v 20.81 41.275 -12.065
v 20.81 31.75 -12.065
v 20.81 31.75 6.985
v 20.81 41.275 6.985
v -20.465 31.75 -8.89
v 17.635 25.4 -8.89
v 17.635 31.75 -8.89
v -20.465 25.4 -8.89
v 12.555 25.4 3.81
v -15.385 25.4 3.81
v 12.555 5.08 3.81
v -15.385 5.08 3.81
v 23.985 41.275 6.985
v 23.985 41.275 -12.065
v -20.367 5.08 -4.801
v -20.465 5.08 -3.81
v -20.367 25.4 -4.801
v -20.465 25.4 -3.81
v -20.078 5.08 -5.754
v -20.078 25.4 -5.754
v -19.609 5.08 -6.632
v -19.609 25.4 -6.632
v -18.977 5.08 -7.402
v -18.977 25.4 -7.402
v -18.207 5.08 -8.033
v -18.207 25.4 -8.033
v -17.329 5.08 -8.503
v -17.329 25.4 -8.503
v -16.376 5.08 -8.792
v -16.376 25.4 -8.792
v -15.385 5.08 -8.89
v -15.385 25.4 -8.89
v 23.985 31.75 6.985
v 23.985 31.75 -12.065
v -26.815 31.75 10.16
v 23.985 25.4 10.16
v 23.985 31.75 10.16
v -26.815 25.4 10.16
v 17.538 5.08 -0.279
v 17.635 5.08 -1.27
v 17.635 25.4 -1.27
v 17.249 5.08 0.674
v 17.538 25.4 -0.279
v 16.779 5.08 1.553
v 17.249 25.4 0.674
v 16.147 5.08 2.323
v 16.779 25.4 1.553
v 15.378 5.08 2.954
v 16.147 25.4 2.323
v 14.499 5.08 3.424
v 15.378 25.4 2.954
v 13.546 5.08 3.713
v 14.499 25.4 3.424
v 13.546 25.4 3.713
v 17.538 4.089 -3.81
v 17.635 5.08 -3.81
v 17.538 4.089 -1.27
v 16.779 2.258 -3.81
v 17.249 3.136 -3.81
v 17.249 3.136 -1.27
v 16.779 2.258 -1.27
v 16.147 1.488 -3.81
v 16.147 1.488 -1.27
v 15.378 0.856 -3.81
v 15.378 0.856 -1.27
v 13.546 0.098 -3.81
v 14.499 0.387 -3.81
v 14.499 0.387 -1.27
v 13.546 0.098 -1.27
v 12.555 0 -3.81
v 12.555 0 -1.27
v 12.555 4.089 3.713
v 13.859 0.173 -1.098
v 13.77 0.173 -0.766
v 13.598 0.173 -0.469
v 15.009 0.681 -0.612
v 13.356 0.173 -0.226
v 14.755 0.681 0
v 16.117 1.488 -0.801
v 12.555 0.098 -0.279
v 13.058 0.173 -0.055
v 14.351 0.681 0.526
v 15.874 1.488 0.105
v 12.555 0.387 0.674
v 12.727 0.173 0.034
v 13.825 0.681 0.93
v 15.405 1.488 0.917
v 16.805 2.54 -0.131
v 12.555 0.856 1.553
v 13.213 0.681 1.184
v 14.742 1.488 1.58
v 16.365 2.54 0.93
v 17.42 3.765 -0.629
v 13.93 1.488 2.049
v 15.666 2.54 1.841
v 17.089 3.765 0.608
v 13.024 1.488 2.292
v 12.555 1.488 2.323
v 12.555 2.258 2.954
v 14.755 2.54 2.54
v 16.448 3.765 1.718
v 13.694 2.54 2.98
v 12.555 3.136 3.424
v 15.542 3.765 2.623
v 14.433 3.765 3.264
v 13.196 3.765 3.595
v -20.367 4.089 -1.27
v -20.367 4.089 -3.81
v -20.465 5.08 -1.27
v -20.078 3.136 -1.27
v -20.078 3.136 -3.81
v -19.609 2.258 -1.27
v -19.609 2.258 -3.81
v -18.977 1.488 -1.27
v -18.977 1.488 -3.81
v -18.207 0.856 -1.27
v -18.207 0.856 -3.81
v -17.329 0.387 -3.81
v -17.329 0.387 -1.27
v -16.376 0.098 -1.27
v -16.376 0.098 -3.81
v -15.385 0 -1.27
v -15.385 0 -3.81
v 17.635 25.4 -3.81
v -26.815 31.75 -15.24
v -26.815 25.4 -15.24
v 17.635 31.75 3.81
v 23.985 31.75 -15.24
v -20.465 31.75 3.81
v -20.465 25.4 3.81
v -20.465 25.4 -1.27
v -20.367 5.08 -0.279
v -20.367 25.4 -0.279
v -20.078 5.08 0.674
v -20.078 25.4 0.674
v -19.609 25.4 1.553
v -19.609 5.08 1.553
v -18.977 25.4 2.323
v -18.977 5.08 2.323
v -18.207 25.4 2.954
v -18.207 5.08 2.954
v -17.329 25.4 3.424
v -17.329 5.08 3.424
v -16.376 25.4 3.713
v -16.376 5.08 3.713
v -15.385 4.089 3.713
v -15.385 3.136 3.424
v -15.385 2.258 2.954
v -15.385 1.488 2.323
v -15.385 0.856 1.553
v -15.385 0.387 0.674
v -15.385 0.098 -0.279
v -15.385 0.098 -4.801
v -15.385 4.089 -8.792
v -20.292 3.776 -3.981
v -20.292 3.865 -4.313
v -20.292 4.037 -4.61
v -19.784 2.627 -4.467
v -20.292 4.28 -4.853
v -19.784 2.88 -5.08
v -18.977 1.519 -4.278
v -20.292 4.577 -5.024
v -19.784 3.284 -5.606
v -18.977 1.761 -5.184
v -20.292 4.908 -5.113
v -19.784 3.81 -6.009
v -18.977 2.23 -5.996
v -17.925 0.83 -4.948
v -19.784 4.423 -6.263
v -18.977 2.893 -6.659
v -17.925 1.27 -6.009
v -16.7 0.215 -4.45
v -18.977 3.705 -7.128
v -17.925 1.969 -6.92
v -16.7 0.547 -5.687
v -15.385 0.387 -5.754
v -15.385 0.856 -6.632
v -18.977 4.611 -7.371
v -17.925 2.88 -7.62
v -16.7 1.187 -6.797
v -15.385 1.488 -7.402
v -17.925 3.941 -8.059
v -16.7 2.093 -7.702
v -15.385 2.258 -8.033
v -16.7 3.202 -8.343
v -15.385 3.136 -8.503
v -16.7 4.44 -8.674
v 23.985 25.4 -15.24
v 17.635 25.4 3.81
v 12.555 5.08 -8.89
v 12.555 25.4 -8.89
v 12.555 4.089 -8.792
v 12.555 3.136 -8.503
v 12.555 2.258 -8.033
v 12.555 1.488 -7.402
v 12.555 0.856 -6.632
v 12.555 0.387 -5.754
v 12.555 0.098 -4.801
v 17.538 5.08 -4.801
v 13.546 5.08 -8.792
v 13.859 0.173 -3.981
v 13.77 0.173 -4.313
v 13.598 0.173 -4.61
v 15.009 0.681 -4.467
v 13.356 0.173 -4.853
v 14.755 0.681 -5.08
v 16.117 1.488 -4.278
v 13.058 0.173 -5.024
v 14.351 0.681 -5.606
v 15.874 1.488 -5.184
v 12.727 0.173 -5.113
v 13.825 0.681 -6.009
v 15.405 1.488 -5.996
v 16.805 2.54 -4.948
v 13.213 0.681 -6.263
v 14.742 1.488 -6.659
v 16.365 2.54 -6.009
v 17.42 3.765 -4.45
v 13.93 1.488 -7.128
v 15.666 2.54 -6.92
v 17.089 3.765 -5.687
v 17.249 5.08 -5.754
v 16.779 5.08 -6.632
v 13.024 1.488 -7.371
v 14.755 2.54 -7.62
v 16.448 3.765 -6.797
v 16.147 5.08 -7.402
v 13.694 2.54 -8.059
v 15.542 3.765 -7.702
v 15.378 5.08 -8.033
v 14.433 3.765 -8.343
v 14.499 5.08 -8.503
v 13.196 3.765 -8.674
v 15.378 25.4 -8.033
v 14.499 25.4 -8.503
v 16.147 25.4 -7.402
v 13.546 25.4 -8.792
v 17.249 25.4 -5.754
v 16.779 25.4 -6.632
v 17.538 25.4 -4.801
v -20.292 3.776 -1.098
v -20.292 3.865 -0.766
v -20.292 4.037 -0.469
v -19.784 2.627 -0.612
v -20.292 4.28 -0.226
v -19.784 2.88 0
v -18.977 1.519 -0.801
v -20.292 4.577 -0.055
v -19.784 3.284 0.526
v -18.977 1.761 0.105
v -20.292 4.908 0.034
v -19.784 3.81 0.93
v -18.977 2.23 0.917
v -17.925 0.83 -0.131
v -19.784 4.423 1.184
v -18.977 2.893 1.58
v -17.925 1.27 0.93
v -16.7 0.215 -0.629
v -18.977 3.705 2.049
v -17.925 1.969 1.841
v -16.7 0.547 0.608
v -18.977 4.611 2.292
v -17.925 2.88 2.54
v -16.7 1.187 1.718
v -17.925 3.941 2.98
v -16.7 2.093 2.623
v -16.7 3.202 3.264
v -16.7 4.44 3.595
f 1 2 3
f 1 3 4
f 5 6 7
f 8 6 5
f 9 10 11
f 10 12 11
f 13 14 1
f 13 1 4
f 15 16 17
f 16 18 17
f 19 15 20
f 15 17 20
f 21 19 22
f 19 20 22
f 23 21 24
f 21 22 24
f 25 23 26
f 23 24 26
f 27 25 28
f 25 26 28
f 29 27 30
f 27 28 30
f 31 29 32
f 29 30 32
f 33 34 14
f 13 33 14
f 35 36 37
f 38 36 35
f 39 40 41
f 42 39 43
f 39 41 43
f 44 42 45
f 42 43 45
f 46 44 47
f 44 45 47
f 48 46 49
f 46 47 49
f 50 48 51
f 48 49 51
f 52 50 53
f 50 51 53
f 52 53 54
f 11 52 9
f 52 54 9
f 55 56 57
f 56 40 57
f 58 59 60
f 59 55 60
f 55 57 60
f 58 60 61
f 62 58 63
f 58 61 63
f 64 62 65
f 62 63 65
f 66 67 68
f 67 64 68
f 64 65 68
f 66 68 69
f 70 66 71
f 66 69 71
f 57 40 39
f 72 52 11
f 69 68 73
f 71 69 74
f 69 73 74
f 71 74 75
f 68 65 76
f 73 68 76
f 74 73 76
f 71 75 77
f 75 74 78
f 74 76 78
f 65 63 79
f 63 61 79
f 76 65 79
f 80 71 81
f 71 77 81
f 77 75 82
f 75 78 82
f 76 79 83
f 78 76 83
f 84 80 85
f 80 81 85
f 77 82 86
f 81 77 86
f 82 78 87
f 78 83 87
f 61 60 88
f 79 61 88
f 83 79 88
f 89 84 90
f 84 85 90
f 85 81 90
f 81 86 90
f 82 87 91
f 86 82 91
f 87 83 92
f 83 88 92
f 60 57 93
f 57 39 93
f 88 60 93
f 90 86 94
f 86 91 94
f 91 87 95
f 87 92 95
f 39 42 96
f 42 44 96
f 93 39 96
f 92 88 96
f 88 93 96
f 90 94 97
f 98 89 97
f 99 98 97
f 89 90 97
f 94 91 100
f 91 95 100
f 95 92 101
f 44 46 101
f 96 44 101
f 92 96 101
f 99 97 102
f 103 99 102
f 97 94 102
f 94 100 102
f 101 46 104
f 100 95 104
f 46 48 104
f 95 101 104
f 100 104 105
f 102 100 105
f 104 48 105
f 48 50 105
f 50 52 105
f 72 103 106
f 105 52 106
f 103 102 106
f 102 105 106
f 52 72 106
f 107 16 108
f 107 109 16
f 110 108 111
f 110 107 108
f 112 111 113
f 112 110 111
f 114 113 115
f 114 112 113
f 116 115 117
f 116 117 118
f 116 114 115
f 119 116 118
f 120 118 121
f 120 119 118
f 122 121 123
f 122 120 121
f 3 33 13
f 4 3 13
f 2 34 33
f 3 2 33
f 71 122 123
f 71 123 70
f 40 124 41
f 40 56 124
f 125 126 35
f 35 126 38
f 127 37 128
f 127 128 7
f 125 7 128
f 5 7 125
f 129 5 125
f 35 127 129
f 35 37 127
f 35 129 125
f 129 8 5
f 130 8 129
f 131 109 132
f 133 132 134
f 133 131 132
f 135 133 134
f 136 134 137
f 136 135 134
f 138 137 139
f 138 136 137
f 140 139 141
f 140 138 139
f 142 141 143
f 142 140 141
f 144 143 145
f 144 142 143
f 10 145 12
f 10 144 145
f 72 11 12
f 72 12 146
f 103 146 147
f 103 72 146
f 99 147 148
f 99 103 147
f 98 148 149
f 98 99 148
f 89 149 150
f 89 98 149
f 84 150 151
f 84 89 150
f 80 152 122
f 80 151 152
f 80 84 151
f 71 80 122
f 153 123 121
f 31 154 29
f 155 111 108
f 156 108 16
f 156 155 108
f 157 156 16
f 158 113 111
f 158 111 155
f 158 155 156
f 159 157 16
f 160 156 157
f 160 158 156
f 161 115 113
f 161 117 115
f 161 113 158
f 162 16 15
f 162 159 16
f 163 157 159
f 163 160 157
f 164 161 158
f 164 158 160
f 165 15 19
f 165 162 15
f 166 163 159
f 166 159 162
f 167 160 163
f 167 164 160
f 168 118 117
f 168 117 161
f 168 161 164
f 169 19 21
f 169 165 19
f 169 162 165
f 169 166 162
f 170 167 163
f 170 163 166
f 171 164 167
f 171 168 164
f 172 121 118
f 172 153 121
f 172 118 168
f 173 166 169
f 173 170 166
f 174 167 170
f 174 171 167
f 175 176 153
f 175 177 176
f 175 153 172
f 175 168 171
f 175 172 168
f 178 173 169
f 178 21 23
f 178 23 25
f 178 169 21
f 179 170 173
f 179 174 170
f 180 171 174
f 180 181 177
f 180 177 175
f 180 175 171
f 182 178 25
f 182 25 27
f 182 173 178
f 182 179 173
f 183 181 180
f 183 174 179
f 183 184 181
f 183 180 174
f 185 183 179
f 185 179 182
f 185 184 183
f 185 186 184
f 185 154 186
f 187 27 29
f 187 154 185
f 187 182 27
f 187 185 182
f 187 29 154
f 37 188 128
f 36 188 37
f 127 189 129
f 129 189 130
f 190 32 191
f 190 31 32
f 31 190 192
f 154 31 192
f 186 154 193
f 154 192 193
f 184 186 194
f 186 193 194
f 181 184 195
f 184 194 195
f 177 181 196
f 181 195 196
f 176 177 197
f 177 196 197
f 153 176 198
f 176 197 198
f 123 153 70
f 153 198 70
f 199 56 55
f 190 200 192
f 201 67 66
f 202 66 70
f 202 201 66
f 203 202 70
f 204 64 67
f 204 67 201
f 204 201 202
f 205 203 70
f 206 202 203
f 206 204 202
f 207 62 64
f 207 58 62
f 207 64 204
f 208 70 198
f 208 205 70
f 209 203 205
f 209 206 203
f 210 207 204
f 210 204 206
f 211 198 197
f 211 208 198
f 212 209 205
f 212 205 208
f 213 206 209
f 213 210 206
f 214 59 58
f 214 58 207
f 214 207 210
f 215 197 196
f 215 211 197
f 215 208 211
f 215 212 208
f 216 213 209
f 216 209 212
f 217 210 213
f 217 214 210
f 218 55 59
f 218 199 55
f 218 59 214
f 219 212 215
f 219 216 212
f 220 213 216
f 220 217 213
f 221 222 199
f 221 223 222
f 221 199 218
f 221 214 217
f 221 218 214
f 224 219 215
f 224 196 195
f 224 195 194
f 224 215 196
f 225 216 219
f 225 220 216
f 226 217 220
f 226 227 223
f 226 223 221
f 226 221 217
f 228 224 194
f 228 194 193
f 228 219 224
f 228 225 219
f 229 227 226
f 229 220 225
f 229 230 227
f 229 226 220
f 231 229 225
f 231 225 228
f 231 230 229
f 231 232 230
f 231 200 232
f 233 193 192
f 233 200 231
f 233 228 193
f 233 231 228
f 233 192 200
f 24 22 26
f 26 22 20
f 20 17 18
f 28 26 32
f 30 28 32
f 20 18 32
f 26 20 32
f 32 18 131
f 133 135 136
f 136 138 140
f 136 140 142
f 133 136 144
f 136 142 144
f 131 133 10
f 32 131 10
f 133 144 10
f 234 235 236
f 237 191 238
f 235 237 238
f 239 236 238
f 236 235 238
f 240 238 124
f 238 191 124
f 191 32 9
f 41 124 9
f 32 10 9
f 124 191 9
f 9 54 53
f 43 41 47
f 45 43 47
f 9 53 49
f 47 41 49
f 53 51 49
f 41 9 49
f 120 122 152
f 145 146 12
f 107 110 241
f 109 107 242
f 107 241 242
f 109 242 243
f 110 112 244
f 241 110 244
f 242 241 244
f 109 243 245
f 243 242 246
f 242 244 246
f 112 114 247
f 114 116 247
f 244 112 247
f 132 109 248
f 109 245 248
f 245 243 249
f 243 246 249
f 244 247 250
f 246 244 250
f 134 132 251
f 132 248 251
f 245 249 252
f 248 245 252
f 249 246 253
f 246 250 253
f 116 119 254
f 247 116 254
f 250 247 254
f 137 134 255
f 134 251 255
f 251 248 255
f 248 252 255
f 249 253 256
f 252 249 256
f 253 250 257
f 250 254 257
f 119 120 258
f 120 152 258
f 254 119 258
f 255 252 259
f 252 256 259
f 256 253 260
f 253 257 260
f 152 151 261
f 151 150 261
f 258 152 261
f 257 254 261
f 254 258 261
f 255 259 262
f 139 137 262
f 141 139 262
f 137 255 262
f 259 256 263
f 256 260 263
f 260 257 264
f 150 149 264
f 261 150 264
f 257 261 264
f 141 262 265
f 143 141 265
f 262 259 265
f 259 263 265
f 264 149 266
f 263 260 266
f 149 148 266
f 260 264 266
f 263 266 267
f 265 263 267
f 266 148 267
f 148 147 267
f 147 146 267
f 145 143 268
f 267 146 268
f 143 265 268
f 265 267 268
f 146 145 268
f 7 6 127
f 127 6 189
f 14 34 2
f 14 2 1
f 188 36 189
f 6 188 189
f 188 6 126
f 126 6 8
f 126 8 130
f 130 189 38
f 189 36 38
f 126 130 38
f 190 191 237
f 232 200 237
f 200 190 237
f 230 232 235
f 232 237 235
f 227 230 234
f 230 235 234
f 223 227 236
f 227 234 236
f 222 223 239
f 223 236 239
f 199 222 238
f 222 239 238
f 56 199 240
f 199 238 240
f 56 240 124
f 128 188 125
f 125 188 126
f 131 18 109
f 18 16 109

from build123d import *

# Parameters (mm, degrees)
F0_W     = 38.1
F0_H     = 12.7
F1_DEPTH = 25.4
F2_W     = 50.8
F2_H     = 25.4
F2_W_2   = 38.1
F2_H_2   = 12.7
F3_DEPTH = 6.35
F4_W     = 9.525
F4_H     = 19.05
F5_DEPTH = 3.175
F6_R     = 5.08


with BuildPart() as f1:
    # F0 (on Front) → F1 (new body)
    with BuildSketch(Plane.XZ):
        with Locations((-1.414714, -2.539574)):
            Rectangle(F0_W, F0_H)
    extrude(amount=-F1_DEPTH)

    # F6
    f6_edges = [f1.edges().sort_by_distance(p)[0] for p in [
        (17.635286, 12.7, 3.810426),
        (17.635286, 12.7, -8.889574),
        (17.635286, 0, -2.539574),
        (-1.414714, 0, 3.810426),
        (-1.414714, 0, -8.889574),
        (-20.464714, 0, -2.539574),
        (-20.464714, 12.7, 3.810426),
        (-20.464714, 12.7, -8.889574),
    ]]
    fillet(f6_edges, radius=F6_R)


with BuildPart() as f3:
    # F2 (on face) → F3 (new body)
    with BuildSketch(Plane(origin=(0, 25.4, 0), x_dir=(-1, 0, 0), z_dir=(0, 1, 0))):
        with Locations((1.414714, -2.539574)):
            Rectangle(F2_W, F2_H)
        with Locations((1.414714, -2.539574)):
            Rectangle(F2_W_2, F2_H_2, mode=Mode.SUBTRACT)
    extrude(amount=F3_DEPTH)


with BuildPart() as f5:
    # F4 (on face) → F5 (new body)
    with BuildSketch(Plane.YZ.offset(23.985286)):
        with Locations((36.5125, -2.539574)):
            Rectangle(F4_W, F4_H)
    extrude(amount=-F5_DEPTH)


solid = Compound([f1.part, f3.part, f5.part])
